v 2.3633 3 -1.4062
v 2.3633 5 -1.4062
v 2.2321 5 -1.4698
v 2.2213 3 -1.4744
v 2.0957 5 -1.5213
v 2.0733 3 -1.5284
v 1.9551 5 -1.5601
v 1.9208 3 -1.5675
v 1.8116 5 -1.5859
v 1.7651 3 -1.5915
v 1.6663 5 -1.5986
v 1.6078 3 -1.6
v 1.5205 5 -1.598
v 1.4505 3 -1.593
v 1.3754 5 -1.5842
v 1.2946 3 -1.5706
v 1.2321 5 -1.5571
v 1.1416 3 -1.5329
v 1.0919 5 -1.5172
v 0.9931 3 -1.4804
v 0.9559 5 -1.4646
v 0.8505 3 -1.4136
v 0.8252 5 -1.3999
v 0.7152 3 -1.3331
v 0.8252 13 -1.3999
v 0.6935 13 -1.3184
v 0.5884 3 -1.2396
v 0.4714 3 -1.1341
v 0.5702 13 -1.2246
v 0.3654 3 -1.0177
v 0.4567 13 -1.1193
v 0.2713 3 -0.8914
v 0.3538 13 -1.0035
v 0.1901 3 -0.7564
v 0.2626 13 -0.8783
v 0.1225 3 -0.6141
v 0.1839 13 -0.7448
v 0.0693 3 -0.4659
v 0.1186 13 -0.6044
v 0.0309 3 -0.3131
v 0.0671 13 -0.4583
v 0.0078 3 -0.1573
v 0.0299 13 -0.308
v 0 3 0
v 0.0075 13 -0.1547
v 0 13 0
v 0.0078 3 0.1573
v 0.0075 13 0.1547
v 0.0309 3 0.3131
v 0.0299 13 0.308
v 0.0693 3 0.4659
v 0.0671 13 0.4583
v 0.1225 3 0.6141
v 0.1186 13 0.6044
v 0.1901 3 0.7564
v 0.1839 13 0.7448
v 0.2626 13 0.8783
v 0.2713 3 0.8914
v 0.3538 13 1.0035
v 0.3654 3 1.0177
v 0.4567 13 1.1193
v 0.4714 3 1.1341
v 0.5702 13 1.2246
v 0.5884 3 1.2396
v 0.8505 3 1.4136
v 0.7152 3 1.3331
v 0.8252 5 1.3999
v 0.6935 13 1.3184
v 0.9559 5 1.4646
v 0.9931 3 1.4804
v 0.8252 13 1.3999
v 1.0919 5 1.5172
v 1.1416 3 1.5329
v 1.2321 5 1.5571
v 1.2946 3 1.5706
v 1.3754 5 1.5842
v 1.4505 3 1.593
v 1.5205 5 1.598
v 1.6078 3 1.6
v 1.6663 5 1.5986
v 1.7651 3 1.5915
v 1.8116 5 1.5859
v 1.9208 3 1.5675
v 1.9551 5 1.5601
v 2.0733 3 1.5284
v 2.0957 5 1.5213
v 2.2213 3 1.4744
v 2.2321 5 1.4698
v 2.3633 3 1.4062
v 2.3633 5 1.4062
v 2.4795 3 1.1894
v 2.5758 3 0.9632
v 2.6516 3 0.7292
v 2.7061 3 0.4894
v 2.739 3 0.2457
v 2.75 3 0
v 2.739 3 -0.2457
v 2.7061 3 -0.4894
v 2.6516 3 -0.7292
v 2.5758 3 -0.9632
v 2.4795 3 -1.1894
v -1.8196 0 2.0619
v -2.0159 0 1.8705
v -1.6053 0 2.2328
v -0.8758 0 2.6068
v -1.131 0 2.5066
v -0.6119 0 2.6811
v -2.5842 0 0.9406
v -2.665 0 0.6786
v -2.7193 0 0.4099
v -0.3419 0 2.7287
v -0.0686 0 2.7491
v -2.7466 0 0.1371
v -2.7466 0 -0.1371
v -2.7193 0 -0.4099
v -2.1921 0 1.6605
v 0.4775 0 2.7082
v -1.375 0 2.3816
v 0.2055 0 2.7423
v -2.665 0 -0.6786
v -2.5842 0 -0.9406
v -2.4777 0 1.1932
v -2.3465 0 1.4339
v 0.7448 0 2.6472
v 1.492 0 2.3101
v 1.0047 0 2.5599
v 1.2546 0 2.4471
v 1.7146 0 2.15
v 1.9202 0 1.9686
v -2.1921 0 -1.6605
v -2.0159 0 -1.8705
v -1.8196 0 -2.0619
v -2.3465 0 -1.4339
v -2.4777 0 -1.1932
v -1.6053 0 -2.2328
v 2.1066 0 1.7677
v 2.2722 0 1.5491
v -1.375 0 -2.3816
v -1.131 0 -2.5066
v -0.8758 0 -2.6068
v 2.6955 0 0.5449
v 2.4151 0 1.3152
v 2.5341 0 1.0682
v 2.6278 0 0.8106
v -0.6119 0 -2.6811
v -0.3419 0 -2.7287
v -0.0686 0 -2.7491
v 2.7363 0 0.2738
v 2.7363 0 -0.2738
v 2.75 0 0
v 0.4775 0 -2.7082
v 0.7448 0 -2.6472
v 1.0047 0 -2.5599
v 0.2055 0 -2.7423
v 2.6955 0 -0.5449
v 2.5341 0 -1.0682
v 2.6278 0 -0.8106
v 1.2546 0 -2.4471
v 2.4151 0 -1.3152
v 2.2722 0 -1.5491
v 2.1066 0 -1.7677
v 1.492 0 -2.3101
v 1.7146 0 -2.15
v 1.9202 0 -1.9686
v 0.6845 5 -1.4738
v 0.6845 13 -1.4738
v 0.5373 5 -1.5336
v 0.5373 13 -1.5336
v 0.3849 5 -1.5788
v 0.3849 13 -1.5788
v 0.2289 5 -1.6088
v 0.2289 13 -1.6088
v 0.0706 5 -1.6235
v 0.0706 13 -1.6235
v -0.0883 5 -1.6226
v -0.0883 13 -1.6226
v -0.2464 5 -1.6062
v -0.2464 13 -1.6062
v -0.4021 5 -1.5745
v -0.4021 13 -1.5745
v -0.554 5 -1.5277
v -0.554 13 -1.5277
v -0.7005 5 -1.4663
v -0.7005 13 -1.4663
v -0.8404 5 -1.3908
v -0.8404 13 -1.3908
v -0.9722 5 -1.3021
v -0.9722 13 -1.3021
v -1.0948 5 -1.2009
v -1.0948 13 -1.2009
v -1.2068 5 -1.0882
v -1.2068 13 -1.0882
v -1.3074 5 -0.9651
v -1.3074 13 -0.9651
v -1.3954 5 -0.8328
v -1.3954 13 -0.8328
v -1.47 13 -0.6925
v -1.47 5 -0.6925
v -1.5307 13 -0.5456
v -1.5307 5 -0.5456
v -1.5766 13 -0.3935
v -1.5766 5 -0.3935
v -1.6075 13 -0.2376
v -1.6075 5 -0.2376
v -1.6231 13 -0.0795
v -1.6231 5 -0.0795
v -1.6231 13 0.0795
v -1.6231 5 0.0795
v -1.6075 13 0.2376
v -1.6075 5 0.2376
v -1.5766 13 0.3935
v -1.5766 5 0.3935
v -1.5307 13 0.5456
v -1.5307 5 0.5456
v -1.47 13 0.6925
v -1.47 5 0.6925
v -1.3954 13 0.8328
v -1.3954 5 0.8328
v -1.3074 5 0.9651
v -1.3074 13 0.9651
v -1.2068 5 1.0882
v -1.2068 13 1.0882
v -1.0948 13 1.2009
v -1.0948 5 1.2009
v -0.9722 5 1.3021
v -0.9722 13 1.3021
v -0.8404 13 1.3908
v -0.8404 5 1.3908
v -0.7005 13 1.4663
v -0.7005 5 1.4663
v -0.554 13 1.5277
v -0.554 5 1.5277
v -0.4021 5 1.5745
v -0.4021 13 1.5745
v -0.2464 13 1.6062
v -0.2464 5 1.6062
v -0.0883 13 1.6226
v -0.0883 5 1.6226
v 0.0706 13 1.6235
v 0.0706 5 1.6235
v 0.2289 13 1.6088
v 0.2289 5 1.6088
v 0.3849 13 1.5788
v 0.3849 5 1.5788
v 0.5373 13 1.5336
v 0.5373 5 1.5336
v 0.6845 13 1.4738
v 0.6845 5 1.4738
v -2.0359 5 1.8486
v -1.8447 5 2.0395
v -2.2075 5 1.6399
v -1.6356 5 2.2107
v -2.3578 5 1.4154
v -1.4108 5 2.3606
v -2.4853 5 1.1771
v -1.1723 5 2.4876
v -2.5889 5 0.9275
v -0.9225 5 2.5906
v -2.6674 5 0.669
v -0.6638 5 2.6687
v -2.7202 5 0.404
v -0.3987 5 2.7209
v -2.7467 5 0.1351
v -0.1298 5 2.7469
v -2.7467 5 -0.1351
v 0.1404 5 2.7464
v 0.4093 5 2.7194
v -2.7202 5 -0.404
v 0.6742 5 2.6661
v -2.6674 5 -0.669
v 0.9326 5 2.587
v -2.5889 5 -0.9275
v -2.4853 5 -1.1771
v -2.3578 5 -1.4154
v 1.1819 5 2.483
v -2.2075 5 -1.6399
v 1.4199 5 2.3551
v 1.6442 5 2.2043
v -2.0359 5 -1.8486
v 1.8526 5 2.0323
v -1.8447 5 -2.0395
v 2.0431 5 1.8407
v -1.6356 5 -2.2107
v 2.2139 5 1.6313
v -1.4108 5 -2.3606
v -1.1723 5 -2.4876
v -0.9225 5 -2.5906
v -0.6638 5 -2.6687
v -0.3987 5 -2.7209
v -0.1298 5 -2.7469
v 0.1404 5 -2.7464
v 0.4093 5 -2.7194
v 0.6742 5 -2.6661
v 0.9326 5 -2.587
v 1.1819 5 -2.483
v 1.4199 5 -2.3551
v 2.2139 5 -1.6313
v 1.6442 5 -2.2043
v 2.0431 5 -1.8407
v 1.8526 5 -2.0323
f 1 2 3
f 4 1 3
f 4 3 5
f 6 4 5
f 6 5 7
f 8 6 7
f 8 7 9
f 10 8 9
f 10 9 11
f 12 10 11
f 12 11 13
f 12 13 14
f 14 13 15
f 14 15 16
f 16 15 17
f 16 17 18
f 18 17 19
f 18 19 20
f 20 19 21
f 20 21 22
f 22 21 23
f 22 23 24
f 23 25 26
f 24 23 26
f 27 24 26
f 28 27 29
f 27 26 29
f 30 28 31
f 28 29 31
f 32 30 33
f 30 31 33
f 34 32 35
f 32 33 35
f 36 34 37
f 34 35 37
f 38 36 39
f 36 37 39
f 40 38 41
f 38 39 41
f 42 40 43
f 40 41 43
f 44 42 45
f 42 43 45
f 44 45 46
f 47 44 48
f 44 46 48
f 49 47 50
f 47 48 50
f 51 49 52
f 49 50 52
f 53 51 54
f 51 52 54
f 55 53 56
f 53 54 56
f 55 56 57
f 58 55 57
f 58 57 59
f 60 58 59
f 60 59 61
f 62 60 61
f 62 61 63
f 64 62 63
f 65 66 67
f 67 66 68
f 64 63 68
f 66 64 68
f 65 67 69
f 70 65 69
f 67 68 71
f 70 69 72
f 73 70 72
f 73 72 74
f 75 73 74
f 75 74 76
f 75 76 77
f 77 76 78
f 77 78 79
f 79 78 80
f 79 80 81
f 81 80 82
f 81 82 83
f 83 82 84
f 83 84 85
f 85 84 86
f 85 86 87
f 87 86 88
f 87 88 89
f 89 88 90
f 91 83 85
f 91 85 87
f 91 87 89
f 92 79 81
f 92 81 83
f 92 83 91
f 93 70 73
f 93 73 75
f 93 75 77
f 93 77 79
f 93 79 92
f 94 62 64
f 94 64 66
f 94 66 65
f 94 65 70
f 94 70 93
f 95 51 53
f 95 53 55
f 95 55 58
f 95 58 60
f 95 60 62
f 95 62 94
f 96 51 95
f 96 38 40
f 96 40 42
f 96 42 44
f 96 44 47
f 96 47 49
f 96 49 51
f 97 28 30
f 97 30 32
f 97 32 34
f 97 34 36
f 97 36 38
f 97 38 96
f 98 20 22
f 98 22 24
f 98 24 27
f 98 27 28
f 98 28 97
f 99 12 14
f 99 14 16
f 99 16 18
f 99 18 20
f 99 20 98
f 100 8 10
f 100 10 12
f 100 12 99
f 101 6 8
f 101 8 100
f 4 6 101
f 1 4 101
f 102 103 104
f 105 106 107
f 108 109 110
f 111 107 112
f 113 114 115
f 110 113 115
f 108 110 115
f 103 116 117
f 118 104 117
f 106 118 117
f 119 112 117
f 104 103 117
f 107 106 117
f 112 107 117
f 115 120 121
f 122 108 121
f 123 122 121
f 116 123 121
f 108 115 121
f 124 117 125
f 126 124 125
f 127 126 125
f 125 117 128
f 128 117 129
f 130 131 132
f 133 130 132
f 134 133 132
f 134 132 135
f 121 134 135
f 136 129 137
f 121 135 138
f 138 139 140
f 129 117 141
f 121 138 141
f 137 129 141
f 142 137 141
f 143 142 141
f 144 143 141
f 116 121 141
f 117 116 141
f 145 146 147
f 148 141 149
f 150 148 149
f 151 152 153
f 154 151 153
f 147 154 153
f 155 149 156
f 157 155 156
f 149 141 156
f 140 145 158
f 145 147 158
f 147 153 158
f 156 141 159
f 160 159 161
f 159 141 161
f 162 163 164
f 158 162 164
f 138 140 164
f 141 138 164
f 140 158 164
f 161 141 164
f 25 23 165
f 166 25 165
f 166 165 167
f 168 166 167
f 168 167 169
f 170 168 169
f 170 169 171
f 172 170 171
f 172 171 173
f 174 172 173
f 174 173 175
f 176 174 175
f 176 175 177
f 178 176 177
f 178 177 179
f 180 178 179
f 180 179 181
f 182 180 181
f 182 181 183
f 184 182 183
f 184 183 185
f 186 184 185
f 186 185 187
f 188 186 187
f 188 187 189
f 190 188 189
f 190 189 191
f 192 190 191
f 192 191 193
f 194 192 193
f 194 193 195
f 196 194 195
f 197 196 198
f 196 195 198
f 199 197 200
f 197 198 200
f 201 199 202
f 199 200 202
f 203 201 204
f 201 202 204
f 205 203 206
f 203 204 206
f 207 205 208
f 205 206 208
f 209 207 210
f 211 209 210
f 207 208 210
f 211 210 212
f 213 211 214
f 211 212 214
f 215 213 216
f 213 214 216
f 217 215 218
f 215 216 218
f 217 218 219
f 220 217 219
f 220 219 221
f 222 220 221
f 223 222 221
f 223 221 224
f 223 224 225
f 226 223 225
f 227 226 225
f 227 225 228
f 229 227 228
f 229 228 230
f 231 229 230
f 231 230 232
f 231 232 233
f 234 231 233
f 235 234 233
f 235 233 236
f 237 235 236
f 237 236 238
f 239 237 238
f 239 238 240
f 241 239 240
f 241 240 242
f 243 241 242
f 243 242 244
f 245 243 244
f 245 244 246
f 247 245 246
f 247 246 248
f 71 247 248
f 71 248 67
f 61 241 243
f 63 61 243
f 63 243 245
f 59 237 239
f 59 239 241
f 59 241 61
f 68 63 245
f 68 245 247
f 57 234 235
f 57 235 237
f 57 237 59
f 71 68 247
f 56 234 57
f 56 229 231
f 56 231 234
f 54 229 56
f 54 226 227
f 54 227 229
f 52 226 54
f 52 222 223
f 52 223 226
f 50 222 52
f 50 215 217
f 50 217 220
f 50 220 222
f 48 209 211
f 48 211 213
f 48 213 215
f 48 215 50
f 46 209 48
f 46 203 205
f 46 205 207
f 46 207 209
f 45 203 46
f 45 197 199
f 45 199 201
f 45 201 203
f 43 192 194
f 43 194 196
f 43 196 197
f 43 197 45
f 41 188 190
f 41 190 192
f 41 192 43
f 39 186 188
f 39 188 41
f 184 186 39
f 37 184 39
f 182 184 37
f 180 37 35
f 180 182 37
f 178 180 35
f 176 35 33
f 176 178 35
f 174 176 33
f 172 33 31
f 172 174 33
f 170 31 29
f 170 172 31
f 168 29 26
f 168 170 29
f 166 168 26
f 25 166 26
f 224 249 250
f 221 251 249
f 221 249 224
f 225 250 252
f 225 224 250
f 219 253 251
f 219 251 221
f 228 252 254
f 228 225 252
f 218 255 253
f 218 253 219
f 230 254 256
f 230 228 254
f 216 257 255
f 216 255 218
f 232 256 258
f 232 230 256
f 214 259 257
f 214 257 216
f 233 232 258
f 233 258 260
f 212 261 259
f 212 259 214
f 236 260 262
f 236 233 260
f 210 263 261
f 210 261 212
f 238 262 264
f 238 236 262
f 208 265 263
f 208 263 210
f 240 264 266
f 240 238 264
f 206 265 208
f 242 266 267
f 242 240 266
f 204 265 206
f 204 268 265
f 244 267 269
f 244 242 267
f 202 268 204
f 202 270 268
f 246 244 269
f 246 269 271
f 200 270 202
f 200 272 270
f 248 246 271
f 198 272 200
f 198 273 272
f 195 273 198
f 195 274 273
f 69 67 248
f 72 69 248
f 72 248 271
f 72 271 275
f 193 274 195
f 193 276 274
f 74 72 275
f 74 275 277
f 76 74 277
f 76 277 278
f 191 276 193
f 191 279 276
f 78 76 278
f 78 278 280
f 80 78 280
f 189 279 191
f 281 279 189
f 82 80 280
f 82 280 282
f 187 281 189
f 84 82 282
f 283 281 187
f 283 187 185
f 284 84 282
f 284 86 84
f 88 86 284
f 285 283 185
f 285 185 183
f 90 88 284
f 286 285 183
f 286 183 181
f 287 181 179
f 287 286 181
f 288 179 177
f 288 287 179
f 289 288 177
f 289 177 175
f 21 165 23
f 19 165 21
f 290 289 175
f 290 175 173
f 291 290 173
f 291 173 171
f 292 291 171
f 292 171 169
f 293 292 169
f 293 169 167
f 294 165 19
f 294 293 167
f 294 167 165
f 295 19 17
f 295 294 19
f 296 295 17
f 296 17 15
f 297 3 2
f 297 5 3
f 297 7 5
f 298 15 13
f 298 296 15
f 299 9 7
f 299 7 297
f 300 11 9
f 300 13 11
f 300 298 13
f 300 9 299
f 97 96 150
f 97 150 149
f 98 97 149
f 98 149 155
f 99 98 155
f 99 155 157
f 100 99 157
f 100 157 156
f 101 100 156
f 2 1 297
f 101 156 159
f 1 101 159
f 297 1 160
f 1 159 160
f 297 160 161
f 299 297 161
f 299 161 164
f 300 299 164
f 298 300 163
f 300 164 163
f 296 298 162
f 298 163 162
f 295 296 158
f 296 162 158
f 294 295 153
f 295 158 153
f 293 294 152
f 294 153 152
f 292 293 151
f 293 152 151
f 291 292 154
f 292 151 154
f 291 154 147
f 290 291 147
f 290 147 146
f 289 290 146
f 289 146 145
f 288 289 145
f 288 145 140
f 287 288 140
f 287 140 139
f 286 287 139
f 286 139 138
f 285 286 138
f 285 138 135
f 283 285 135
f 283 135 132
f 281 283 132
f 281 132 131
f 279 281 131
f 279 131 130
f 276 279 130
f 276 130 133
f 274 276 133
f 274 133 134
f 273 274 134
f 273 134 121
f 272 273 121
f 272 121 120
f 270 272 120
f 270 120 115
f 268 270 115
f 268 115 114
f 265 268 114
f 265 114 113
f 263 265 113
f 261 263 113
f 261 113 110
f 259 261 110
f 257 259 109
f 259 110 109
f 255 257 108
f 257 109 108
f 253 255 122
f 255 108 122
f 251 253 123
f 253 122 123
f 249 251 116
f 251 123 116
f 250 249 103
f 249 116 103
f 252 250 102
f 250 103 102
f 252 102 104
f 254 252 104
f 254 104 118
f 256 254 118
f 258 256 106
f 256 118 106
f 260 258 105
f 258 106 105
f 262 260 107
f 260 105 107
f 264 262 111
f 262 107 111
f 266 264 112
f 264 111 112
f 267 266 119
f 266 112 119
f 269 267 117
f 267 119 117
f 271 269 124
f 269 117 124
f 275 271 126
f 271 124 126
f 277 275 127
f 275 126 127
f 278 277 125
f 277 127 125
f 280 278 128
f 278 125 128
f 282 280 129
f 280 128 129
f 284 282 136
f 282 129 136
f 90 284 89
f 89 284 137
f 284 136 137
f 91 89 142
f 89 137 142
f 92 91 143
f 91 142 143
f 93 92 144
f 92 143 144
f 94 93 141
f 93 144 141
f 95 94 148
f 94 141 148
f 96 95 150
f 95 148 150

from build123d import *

# Parameters (mm, degrees)
SKETCH1_R           = 2.75
SKETCH1_R_2         = 1.625
BOSS_EXTRUDE1_DEPTH = 5
SKETCH1_4_R         = 1.625
BOSS_EXTRUDE3_DEPTH = 13
CUT_EXTRUDE3_START  = 13
SKETCH1_6_R         = 1.6
CUT_EXTRUDE3_DEPTH  = 10


with BuildPart() as part:
    # Sketch1 → Boss-Extrude1 (new body)
    with BuildSketch(Plane(origin=(0, 0, 0), x_dir=(1, 0, 0), z_dir=(0, 1, 0))):
        Circle(SKETCH1_R)
        Circle(SKETCH1_R_2, mode=Mode.SUBTRACT)
    extrude(amount=BOSS_EXTRUDE1_DEPTH)

    # Sketch1<4> → Boss-Extrude3 (add)
    with BuildSketch(Plane(origin=(0, 0, 0), x_dir=(1, 0, 0), z_dir=(0, 1, 0))):
        Circle(SKETCH1_4_R)
    extrude(amount=BOSS_EXTRUDE3_DEPTH)

    # Sketch1<6> → Cut-Extrude3 (cut)
    with BuildSketch(Plane(origin=(0, 0, 0), x_dir=(1, 0, 0), z_dir=(0, 1, 0)).offset(CUT_EXTRUDE3_START)):
        with Locations((1.6, 0)):
            Circle(SKETCH1_6_R)
    extrude(amount=-CUT_EXTRUDE3_DEPTH, mode=Mode.SUBTRACT)


solid = part.part
